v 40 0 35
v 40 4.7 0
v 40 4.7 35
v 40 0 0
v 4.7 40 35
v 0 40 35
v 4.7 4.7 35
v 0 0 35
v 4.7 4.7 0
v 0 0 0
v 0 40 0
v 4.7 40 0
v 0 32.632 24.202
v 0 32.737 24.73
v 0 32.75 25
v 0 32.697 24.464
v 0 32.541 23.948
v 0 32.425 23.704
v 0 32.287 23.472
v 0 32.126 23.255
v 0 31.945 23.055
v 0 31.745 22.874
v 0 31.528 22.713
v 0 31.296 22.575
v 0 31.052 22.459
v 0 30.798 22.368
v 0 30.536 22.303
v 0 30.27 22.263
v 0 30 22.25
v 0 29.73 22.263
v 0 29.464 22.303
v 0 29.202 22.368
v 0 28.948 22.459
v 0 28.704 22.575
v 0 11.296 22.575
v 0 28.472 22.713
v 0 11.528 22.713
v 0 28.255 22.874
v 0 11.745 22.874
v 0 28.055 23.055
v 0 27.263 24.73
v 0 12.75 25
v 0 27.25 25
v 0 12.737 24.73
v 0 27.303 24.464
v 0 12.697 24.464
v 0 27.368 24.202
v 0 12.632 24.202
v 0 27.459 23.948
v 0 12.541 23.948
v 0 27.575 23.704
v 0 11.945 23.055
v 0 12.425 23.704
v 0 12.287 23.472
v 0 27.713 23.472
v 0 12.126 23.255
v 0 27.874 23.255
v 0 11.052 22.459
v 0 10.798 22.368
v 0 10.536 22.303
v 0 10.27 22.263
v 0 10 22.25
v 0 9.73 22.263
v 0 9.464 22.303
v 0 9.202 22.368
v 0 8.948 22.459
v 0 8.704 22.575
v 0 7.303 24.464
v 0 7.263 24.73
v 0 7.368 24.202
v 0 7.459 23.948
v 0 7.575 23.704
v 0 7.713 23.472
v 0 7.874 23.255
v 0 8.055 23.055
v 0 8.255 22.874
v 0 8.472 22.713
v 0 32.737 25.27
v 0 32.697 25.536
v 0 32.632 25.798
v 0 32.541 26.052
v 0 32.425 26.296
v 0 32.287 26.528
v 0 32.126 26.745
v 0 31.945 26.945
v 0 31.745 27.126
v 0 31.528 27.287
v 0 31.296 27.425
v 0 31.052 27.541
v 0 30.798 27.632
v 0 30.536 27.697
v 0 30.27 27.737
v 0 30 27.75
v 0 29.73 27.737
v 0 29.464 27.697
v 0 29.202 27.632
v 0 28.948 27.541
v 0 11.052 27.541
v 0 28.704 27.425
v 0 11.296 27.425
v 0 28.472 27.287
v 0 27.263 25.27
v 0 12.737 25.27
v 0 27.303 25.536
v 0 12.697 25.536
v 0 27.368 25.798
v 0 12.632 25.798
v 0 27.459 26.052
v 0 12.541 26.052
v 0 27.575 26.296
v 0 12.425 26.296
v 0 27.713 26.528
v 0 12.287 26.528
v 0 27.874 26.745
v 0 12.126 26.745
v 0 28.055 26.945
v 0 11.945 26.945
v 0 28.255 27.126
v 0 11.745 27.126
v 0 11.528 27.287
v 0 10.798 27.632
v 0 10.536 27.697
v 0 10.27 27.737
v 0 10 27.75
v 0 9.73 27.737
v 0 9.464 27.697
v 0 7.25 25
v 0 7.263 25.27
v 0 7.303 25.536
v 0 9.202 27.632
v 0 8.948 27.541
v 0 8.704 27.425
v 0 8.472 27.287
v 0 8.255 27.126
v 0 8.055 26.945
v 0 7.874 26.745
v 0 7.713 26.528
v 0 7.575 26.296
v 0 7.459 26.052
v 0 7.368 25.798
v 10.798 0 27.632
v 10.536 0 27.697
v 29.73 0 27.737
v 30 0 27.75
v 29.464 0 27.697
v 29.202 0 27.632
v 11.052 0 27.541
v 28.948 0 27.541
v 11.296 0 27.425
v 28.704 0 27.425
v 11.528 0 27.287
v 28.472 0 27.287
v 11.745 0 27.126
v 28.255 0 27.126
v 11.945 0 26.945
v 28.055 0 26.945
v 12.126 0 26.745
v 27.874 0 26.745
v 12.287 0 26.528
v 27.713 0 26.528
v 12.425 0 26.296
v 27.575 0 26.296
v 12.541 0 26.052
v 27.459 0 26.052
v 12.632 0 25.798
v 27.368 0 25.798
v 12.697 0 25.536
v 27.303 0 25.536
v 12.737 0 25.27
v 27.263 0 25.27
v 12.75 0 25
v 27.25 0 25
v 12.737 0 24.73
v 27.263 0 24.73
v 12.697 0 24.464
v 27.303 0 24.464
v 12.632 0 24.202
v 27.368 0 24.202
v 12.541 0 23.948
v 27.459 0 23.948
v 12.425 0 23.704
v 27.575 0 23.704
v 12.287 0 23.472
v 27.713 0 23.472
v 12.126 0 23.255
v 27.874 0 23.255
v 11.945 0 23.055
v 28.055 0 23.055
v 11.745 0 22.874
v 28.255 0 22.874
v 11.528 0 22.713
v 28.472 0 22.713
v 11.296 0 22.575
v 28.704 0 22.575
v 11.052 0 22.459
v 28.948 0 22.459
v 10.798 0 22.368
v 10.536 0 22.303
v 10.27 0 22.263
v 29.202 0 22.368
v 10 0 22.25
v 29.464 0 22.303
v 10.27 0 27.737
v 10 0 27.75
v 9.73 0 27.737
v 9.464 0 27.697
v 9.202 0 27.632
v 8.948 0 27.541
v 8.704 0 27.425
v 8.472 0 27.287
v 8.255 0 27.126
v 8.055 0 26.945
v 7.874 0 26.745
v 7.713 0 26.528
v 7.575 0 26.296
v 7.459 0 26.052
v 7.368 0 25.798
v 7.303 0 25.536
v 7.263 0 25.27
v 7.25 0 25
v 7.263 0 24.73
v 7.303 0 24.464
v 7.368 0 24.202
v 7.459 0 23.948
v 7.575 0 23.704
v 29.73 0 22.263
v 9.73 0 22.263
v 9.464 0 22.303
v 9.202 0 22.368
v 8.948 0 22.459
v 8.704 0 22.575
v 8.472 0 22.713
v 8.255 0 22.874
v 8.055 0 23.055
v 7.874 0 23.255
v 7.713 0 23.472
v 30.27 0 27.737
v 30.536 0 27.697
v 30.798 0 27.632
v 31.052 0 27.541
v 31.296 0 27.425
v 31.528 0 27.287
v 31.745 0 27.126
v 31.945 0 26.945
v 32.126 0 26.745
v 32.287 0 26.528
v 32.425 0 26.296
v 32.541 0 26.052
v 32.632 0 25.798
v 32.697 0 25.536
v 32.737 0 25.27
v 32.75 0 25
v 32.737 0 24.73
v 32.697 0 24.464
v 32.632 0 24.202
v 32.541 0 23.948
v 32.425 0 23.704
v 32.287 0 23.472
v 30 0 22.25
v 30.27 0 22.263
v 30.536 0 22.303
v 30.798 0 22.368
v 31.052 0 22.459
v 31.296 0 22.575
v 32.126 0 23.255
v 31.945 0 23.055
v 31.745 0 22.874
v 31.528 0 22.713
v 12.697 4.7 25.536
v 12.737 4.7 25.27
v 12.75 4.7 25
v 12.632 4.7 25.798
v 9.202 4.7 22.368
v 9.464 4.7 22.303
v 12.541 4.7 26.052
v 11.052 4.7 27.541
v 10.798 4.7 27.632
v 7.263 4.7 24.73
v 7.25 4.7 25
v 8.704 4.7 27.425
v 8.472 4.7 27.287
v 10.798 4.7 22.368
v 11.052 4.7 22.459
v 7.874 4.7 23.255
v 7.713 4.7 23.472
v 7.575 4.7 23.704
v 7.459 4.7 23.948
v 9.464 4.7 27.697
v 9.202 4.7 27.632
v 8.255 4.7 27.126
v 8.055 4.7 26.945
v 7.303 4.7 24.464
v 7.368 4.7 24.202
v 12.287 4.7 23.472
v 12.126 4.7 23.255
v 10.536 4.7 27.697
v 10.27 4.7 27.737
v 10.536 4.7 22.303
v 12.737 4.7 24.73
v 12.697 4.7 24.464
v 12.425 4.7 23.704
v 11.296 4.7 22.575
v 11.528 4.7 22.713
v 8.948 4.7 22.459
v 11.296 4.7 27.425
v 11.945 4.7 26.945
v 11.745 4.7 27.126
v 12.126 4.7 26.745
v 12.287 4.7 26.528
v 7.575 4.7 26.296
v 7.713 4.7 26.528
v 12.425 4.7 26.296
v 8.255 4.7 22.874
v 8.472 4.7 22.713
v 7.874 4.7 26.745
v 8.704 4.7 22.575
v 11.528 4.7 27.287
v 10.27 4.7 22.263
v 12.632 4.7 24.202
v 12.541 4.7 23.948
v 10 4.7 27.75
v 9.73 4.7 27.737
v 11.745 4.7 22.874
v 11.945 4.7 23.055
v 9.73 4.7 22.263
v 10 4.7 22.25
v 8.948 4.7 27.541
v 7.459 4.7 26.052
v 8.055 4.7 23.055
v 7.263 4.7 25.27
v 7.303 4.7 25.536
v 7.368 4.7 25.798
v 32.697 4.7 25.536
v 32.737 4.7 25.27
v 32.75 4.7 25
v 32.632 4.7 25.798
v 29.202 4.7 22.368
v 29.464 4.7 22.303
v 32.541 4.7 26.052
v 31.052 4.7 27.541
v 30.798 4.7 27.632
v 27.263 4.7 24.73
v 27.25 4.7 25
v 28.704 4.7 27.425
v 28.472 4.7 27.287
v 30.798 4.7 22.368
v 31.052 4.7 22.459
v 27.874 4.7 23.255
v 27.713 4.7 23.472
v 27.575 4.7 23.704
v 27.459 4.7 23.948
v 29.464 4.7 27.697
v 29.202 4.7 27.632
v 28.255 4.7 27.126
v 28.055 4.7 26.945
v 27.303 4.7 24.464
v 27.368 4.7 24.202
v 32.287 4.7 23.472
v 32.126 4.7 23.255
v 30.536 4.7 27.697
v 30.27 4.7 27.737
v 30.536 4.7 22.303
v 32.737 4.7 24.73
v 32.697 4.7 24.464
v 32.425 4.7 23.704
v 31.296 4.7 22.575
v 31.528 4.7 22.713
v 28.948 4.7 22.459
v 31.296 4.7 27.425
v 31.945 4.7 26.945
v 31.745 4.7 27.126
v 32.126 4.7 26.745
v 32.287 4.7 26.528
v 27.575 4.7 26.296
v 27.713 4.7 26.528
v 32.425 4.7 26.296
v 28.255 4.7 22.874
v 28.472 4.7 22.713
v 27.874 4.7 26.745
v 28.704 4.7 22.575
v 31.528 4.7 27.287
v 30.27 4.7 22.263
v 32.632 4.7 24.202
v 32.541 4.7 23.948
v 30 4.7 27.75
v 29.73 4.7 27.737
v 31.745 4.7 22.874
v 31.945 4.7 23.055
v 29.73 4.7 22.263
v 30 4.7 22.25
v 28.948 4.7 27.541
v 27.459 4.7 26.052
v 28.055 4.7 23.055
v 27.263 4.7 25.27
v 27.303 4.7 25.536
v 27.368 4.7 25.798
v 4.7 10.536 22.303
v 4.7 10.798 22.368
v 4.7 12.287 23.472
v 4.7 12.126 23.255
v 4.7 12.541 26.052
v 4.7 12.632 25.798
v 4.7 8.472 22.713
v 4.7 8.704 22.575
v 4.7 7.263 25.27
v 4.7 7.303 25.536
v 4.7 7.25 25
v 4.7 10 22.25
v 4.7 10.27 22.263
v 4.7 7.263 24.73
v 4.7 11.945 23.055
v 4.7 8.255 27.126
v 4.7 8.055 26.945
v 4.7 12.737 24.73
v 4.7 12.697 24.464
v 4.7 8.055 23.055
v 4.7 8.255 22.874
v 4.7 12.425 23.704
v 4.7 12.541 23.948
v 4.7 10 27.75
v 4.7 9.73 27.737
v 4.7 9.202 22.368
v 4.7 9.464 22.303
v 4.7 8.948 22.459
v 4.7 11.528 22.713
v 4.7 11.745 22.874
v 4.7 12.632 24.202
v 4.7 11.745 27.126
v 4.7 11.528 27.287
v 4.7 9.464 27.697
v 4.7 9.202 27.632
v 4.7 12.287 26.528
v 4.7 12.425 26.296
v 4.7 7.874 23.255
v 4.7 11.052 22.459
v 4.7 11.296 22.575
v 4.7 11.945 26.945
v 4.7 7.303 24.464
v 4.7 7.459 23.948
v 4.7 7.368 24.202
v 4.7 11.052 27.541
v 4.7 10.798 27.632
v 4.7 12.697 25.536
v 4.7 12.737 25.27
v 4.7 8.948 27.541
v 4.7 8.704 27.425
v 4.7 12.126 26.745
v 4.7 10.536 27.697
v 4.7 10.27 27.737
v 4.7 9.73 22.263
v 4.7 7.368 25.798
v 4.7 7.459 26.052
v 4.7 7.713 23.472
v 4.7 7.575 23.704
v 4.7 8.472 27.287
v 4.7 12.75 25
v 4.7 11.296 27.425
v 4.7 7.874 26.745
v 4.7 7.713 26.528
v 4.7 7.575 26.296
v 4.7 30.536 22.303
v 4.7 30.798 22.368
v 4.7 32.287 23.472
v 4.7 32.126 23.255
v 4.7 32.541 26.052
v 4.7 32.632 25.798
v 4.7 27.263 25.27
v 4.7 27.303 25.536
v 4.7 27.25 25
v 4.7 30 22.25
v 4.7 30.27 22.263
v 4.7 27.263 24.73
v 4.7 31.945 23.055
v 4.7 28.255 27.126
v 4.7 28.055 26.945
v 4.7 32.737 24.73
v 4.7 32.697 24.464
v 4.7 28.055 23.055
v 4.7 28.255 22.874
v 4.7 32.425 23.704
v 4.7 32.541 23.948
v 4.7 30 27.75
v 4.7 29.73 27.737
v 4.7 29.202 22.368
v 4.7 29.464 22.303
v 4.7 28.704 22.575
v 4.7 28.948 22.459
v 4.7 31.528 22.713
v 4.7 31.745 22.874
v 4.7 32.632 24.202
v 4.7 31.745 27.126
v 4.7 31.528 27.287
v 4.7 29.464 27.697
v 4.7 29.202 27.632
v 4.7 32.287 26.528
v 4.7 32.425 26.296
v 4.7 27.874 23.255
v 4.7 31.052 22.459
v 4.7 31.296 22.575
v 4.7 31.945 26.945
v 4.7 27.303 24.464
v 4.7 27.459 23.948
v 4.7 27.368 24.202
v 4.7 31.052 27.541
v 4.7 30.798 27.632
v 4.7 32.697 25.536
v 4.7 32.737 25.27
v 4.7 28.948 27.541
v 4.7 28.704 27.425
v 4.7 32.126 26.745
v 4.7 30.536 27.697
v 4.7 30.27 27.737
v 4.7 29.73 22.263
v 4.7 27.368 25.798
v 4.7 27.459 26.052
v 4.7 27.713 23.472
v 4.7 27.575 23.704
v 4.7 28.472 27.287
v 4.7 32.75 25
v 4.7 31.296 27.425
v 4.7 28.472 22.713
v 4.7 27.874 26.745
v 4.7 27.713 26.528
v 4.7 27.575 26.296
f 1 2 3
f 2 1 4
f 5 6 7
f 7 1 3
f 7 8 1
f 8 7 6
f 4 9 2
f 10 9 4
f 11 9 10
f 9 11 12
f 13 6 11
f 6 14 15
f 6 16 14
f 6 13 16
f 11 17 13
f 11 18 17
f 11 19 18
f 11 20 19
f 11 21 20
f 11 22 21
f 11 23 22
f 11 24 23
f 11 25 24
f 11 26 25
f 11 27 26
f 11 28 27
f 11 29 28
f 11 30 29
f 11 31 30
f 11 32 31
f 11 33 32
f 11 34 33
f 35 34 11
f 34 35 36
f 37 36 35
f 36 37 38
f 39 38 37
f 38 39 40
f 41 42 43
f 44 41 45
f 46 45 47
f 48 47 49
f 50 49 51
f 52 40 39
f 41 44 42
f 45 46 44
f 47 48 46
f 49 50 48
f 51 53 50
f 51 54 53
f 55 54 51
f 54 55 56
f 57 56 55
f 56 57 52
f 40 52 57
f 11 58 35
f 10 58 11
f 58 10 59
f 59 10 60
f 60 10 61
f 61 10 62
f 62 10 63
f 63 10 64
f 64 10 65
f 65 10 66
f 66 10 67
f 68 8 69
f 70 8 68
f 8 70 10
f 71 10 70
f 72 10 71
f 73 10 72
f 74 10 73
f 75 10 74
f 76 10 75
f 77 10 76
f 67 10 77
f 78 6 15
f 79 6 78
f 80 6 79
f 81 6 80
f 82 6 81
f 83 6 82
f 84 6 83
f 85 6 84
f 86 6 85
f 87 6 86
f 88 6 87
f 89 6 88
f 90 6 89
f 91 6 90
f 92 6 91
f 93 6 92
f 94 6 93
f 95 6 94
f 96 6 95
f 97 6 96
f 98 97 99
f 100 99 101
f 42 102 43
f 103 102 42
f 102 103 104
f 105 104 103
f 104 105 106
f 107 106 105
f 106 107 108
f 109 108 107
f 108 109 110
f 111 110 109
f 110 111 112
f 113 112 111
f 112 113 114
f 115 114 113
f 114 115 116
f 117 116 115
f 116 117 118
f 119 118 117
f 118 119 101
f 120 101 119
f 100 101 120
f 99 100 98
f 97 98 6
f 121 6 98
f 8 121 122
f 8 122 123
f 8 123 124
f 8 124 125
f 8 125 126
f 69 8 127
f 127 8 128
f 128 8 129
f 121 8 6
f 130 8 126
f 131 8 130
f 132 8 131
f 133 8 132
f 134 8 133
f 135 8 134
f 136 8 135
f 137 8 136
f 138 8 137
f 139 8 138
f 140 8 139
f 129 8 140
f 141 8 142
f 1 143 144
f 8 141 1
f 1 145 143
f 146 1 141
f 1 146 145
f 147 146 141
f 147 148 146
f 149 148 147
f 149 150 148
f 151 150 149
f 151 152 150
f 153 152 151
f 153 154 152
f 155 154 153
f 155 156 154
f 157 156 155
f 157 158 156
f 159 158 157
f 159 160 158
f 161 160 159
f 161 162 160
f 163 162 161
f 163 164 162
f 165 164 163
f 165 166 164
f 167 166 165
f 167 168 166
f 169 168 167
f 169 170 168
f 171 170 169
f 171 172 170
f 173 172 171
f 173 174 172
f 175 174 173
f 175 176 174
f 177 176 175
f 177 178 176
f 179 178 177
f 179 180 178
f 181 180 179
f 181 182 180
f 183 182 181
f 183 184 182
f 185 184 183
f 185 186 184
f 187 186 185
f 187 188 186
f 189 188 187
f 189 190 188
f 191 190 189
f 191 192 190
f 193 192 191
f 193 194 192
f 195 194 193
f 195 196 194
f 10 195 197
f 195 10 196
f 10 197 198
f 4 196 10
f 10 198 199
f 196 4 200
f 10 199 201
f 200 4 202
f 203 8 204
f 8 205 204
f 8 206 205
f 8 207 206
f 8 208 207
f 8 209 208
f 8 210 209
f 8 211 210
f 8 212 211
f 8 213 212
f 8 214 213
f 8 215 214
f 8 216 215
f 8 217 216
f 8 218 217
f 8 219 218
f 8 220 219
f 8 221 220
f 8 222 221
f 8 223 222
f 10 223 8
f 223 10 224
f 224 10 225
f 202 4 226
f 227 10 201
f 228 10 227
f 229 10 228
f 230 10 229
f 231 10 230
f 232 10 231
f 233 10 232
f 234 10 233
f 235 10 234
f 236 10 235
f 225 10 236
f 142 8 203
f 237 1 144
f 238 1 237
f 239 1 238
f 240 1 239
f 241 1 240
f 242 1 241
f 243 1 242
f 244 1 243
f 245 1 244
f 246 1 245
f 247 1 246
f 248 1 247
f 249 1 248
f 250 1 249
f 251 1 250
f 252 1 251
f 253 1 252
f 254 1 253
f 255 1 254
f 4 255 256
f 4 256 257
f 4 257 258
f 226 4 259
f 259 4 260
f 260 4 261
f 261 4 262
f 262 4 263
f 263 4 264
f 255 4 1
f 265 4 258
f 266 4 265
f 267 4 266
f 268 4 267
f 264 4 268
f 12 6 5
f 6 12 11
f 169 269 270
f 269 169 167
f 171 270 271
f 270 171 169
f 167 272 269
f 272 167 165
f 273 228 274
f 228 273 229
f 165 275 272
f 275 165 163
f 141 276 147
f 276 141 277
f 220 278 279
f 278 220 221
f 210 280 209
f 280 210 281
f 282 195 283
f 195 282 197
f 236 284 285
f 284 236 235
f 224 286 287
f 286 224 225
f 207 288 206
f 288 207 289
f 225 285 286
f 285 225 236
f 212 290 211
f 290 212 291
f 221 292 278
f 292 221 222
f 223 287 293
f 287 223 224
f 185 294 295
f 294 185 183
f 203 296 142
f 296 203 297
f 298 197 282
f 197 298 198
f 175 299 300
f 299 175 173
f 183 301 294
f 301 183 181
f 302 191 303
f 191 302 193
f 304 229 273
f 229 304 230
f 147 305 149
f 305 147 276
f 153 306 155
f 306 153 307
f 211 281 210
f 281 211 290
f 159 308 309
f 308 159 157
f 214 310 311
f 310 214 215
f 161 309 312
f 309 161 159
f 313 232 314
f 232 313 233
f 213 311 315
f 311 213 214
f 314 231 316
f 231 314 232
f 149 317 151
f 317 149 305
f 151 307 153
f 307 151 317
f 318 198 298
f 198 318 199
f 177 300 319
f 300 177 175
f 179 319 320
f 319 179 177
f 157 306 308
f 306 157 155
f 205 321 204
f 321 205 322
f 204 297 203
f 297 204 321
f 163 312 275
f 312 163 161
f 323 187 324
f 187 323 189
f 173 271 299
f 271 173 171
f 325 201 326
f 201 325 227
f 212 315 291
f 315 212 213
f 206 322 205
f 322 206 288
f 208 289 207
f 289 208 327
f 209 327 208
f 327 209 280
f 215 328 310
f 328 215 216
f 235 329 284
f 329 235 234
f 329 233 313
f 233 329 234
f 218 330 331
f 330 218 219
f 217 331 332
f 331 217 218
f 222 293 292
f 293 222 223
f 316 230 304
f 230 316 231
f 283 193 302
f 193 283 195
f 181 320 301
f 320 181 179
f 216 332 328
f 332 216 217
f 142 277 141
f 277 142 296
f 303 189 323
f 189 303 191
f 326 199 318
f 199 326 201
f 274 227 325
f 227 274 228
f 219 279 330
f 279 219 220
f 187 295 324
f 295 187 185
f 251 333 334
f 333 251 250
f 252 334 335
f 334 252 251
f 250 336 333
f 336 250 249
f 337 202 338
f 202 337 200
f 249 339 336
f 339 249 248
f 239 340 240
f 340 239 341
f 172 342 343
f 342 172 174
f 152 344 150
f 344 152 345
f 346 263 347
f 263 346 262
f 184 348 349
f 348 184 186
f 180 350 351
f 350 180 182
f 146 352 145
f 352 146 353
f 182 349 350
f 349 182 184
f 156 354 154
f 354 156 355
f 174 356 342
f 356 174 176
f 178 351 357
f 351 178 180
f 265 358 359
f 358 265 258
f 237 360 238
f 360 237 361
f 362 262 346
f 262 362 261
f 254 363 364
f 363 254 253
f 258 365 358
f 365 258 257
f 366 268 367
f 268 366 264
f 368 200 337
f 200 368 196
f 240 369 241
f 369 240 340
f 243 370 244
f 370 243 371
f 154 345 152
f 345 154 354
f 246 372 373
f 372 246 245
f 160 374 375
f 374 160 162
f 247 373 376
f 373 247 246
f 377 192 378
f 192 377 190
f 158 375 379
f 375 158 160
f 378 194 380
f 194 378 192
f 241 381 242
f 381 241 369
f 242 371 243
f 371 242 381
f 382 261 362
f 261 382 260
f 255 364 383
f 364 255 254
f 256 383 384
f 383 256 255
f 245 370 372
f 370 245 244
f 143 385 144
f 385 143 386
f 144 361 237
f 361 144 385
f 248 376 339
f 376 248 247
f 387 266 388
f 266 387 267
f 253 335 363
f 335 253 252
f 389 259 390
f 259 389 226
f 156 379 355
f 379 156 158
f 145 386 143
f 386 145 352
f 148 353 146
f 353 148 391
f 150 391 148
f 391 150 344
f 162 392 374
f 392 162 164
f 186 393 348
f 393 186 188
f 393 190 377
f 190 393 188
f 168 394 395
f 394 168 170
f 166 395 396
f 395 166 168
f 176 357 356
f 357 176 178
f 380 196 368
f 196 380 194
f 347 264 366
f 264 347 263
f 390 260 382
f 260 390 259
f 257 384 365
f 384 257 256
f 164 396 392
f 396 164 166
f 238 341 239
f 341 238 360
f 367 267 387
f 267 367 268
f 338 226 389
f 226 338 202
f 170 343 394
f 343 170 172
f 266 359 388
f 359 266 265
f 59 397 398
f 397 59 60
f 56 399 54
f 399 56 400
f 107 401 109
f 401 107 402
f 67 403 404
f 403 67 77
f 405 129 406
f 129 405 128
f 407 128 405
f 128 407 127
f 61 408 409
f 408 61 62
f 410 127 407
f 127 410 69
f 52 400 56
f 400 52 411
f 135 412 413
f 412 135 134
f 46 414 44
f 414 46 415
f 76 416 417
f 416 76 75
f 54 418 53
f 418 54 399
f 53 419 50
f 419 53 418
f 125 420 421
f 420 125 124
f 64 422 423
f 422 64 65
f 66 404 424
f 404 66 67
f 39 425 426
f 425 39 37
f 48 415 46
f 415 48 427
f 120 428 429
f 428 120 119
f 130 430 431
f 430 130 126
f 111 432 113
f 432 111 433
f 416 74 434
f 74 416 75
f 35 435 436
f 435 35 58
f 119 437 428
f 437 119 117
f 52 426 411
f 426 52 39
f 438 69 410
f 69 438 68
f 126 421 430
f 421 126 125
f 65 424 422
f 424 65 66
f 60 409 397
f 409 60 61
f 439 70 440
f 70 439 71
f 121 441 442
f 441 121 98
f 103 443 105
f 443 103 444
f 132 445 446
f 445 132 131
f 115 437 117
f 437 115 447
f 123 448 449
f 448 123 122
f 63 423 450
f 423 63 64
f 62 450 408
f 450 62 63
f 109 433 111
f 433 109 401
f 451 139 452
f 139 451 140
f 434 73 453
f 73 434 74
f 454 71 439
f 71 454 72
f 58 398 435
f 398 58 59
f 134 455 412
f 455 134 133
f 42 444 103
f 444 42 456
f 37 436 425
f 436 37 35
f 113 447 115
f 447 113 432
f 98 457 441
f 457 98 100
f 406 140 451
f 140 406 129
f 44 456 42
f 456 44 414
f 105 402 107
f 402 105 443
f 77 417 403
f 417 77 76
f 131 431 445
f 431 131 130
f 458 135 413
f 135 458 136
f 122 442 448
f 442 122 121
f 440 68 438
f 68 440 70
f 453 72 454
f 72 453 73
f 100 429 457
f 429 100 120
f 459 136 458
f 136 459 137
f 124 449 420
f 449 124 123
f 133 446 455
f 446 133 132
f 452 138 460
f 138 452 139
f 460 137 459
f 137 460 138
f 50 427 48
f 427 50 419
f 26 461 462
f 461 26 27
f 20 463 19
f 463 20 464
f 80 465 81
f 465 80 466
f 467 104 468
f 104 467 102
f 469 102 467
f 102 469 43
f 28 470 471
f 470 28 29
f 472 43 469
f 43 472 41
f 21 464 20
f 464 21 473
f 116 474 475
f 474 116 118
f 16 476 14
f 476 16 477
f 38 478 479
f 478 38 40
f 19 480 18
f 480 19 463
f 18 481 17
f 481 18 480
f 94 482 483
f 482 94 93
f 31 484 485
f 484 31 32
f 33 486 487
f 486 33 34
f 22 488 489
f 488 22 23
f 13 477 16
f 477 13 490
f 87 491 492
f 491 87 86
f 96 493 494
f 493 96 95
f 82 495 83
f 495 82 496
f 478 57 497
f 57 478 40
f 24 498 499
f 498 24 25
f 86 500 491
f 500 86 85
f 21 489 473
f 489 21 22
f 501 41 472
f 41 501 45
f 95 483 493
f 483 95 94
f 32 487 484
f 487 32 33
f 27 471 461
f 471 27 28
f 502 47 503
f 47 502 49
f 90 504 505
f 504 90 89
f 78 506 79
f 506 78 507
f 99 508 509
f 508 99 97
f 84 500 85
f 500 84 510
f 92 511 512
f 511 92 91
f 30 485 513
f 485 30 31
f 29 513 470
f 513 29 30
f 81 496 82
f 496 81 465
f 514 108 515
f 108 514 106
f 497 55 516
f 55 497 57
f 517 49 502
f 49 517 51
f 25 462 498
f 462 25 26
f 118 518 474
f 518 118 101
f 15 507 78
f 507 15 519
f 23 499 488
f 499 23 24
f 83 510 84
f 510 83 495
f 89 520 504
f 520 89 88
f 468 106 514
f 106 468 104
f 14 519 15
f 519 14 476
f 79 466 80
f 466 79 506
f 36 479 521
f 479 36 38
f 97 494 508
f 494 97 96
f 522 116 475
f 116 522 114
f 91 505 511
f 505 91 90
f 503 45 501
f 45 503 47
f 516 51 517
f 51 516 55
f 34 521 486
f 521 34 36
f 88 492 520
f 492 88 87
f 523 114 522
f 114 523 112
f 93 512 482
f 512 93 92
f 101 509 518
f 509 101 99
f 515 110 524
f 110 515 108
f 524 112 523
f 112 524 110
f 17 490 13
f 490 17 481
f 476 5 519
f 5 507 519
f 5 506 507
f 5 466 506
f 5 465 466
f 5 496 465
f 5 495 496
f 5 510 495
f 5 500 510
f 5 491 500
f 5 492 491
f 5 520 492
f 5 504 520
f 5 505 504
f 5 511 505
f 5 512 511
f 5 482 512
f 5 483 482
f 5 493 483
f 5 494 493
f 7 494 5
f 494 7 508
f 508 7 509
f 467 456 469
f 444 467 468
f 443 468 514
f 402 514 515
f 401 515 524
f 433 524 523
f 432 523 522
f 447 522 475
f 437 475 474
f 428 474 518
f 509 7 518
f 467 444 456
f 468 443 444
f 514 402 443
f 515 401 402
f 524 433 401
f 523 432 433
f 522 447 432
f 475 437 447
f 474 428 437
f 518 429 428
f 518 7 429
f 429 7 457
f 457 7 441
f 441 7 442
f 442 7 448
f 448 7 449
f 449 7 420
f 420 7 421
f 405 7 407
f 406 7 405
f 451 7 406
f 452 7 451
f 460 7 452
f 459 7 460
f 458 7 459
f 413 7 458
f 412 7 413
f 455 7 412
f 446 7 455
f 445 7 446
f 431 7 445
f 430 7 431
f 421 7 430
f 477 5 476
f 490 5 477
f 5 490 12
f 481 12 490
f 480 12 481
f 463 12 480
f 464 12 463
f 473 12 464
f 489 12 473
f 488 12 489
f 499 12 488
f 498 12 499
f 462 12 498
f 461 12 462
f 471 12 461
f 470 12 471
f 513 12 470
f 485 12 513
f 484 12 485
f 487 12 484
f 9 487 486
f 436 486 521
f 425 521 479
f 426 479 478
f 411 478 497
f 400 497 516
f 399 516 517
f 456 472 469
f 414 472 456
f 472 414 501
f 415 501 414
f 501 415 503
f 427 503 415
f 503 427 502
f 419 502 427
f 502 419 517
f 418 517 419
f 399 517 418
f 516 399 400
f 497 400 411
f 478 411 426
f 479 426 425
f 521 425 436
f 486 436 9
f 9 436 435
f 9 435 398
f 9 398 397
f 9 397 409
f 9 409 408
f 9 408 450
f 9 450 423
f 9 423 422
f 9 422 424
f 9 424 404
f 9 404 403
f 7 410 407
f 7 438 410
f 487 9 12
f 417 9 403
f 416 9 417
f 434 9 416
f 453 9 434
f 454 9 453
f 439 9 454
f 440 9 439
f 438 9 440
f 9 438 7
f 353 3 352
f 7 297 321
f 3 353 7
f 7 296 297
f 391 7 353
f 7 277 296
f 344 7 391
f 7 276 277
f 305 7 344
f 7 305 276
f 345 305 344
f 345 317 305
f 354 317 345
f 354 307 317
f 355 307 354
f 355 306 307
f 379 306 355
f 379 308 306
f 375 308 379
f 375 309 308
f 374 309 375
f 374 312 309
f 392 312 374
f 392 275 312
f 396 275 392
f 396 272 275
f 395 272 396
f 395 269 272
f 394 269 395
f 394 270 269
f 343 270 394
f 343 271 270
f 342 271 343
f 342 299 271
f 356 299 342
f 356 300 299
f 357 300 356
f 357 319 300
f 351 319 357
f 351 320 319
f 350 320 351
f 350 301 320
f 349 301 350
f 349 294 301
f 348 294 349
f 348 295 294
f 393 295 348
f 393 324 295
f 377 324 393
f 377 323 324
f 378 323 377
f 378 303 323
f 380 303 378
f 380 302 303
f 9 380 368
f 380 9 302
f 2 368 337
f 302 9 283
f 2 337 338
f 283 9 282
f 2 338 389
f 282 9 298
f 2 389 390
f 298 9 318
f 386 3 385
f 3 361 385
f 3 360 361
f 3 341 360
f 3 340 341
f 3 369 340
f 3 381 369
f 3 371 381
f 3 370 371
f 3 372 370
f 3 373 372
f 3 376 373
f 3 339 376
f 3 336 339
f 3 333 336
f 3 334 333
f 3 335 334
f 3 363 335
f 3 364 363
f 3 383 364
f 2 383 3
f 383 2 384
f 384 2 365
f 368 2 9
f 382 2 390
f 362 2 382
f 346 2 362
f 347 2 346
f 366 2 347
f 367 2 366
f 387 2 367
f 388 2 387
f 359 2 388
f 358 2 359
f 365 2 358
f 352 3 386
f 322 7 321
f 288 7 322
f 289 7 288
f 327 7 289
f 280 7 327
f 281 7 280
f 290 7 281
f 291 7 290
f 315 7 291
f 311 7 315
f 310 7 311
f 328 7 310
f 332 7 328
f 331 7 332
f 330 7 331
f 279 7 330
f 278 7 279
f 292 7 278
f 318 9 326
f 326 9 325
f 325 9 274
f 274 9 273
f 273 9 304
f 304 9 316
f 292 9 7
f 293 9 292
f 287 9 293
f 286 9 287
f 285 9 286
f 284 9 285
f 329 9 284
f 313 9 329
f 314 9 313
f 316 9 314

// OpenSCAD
$fn = 64;

// Target overall size (bracket envelope)
leg_length_x_mm = 40;   // X leg length
leg_length_y_mm = 40;   // Y leg length
height_z_mm     = 35;   // Z height

// Bracket details
wall_thickness_mm   = 5;
hole_diameter_mm    = 5.5;
hole_edge_offset_mm = 10;
relief_clearance_mm = 0.6;   // small clearance for inner relief
overlap_mm          = 0.8;   // ensures boolean robustness

// ---- Helpers ----
module l_bracket_solid() {
    // L-shaped solid made from two connected legs
    union() {
        // X leg
        translate([leg_length_x_mm/2, wall_thickness_mm/2, height_z_mm/2])
            cube([leg_length_x_mm, wall_thickness_mm, height_z_mm], center=true);

        // Y leg
        translate([wall_thickness_mm/2, leg_length_y_mm/2, height_z_mm/2])
            cube([wall_thickness_mm, leg_length_y_mm, height_z_mm], center=true);

        // Corner fill to avoid any internal seam
        translate([wall_thickness_mm/2, wall_thickness_mm/2, height_z_mm/2])
            cube([wall_thickness_mm, wall_thickness_mm, height_z_mm], center=true);
    }
}

module inner_relief_cut() {
    // Remove material to create a typical inner-corner relief (keeps L profile)
    // Leaves wall_thickness on both legs.
    translate([wall_thickness_mm + (leg_length_x_mm - wall_thickness_mm)/2,
               wall_thickness_mm + (leg_length_y_mm - wall_thickness_mm)/2,
               height_z_mm/2])
        cube([leg_length_x_mm - wall_thickness_mm + relief_clearance_mm,
              leg_length_y_mm - wall_thickness_mm + relief_clearance_mm,
              height_z_mm + 2*overlap_mm], center=true);
}

module mounting_holes_cut() {
    // Two holes through X-leg (along Y), and two holes through Y-leg (along X)
    zc = height_z_mm - hole_edge_offset_mm;

    // Holes through X-leg (axis Y)
    for (xpos = [hole_edge_offset_mm, leg_length_x_mm - hole_edge_offset_mm]) {
        translate([xpos, wall_thickness_mm/2, zc])
            rotate([90, 0, 0])
                cylinder(d=hole_diameter_mm, h=wall_thickness_mm + 2*overlap_mm, center=true);
    }

    // Holes through Y-leg (axis X)
    for (ypos = [hole_edge_offset_mm, leg_length_y_mm - hole_edge_offset_mm]) {
        translate([wall_thickness_mm/2, ypos, zc])
            rotate([0, 90, 0])
                cylinder(d=hole_diameter_mm, h=wall_thickness_mm + 2*overlap_mm, center=true);
    }
}

// ---- Final model (ONE connected solid) ----
difference() {
    l_bracket_solid();
    inner_relief_cut();
    mounting_holes_cut();
}
